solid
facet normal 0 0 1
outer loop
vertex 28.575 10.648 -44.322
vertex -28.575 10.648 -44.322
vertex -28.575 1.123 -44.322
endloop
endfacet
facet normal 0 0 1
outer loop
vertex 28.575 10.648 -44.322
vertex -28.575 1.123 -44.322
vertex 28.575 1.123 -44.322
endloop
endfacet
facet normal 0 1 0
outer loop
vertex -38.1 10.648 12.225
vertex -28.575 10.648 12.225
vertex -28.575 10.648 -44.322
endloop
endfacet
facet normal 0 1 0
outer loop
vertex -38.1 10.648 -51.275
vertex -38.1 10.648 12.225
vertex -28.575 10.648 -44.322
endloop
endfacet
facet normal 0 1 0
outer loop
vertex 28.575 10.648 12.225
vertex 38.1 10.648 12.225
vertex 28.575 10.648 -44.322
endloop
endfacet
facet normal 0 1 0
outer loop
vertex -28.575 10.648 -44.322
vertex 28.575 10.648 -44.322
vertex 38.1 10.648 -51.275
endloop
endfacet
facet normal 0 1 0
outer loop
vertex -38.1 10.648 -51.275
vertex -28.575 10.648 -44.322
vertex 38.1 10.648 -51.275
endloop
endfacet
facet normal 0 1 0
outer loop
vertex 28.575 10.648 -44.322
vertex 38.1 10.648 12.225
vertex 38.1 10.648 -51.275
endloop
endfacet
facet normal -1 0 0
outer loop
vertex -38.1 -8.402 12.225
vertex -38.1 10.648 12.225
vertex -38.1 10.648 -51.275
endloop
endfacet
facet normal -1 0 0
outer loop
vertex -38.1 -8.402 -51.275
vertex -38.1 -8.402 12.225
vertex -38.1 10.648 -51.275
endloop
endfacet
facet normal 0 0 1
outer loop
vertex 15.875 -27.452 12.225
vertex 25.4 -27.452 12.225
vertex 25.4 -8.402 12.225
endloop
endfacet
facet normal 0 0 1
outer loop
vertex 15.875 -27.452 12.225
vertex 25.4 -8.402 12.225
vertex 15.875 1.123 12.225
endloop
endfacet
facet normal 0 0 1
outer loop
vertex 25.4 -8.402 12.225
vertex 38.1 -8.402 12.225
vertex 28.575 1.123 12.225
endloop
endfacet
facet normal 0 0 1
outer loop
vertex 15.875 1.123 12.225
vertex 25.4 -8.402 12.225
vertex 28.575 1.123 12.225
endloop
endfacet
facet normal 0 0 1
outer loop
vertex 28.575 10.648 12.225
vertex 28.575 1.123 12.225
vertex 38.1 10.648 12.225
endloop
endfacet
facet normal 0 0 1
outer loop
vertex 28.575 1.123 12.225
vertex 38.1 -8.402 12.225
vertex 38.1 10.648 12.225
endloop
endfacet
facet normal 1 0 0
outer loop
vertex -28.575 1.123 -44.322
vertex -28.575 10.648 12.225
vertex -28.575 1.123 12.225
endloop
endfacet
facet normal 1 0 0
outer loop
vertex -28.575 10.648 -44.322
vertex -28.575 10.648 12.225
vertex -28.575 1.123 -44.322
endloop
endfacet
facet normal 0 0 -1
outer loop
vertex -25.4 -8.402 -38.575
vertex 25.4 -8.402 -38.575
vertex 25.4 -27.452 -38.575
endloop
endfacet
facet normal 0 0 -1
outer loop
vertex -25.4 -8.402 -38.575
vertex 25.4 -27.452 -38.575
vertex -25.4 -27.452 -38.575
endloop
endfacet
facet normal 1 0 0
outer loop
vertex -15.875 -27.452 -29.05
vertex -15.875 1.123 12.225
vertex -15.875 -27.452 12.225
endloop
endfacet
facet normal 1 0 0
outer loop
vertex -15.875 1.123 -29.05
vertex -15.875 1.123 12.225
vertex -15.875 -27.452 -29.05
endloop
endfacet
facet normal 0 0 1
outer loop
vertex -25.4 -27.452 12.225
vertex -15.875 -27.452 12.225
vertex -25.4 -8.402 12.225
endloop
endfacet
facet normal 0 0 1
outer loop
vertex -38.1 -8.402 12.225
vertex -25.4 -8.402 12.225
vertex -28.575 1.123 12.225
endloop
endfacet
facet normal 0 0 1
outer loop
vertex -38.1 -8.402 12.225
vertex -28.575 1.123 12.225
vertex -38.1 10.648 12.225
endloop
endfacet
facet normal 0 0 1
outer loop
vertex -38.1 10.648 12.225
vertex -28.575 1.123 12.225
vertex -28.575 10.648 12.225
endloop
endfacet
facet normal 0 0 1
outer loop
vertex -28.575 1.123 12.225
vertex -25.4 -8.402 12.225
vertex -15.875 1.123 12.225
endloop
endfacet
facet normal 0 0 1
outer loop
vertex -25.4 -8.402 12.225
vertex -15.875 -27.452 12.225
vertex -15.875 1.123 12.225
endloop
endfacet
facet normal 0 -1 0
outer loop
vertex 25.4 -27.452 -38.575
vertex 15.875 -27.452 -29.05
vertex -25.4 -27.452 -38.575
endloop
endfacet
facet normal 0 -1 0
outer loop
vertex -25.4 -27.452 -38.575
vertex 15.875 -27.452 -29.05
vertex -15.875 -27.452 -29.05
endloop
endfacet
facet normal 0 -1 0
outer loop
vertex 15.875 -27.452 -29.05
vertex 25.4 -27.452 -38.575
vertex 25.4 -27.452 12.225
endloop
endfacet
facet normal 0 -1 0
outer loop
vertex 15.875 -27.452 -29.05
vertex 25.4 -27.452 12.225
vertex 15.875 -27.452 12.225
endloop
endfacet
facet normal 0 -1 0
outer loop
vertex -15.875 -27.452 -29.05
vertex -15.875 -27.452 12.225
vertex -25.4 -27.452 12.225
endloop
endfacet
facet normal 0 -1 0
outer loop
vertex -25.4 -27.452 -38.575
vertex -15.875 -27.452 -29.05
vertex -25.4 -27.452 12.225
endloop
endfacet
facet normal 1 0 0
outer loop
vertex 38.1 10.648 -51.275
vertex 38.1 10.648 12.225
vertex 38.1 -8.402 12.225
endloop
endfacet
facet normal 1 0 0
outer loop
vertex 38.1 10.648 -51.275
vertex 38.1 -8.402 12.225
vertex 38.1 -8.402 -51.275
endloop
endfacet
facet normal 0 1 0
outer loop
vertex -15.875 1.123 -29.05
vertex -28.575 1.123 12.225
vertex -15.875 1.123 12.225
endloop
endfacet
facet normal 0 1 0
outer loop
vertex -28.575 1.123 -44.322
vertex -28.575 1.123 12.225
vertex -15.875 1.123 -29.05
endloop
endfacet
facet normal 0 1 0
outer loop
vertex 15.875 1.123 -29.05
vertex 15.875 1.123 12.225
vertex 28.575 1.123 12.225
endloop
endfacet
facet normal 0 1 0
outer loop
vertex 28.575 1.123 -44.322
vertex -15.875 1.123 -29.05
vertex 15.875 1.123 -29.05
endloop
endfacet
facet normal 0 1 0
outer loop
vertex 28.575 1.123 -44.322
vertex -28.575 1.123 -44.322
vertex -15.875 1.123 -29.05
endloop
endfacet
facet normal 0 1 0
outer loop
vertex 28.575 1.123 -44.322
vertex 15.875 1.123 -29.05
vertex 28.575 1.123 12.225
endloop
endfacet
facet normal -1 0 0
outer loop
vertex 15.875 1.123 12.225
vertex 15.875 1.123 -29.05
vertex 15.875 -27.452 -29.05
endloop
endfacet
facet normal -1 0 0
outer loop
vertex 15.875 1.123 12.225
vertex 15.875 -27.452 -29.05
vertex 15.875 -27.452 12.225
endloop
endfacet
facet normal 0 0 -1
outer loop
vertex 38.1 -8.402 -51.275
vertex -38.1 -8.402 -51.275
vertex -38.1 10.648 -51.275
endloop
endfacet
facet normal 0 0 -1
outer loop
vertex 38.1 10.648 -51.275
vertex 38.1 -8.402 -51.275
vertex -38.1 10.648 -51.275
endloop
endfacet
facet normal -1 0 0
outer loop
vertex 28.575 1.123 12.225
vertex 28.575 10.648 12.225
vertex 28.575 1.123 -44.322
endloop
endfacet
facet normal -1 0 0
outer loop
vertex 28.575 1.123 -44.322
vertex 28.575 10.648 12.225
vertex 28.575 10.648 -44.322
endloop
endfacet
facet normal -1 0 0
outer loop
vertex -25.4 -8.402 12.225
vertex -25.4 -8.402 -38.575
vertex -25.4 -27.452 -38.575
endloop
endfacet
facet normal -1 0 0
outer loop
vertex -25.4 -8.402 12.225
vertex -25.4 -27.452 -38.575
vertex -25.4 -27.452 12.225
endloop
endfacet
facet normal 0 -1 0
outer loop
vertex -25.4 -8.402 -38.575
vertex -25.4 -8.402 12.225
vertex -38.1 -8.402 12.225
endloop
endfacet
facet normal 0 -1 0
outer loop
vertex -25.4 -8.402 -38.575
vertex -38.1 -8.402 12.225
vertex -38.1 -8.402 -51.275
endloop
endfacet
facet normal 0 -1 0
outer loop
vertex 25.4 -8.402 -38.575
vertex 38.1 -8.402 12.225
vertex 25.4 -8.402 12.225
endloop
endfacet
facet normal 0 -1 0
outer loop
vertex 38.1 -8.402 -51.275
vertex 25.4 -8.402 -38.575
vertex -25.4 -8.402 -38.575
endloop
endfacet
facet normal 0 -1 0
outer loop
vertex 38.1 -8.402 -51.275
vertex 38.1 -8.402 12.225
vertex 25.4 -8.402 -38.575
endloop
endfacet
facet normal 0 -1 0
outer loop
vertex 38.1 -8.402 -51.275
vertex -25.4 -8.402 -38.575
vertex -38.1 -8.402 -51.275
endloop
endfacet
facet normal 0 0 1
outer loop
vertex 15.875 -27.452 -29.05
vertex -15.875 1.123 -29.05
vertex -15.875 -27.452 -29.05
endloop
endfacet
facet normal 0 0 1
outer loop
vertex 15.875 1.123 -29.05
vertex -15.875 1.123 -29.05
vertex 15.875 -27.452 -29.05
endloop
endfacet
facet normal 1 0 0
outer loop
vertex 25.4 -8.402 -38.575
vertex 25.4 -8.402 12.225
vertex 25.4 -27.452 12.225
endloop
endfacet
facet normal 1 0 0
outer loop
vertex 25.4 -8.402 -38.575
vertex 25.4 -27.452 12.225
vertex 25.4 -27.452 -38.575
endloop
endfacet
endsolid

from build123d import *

# Parameters (mm, degrees)
SKETCH1_W           = 63.5
SKETCH1_H           = 19.05
BOSS_EXTRUDE1_DEPTH = 38.1
SKETCH2_W           = 57.15
SKETCH2_H           = 56.546509541
CUT_EXTRUDE1_DEPTH  = 9.525
BOSS_EXTRUDE3_DEPTH = 19.05
SKETCH6_W           = 31.75
SKETCH6_H           = 41.275
CUT_EXTRUDE3_DEPTH  = 19.05


with BuildPart() as part:
    # Sketch1 → Boss-Extrude1 (new body, symmetric)
    with BuildSketch(Plane(origin=(0, 0, 0), x_dir=(0, 0, -1), z_dir=(1, 0, 0))):
        with Locations((19.525170068, 1.123129252)):
            Rectangle(SKETCH1_W, SKETCH1_H)
    extrude(amount=BOSS_EXTRUDE1_DEPTH, both=True)

    # Sketch2 → Cut-Extrude1 (cut)
    with BuildSketch(Plane(origin=(0, 10.648129252, 0), x_dir=(1, 0, 0), z_dir=(0, 1, 0))):
        with Locations((0, 16.048424839)):
            Rectangle(SKETCH2_W, SKETCH2_H)
    extrude(amount=-CUT_EXTRUDE1_DEPTH, mode=Mode.SUBTRACT)

    # Sketch5 → Boss-Extrude3 (add)
    with BuildSketch(Plane.XZ.offset(8.401870748)):
        Polygon((-25.4, 12.224829932), (-15.875, 12.224829932), (-15.875, -29.050170068), (15.875, -29.050170068), (15.875, 12.224829932), (25.4, 12.224829932), (25.4, -38.575170068), (-25.4, -38.575170068), align=None)
    extrude(amount=BOSS_EXTRUDE3_DEPTH)

    # Sketch6 → Cut-Extrude3 (cut)
    with BuildSketch(Plane.XZ.offset(8.401870748)):
        with Locations((0, -8.412670068)):
            Rectangle(SKETCH6_W, SKETCH6_H)
    extrude(amount=-CUT_EXTRUDE3_DEPTH, mode=Mode.SUBTRACT)


solid = part.part
